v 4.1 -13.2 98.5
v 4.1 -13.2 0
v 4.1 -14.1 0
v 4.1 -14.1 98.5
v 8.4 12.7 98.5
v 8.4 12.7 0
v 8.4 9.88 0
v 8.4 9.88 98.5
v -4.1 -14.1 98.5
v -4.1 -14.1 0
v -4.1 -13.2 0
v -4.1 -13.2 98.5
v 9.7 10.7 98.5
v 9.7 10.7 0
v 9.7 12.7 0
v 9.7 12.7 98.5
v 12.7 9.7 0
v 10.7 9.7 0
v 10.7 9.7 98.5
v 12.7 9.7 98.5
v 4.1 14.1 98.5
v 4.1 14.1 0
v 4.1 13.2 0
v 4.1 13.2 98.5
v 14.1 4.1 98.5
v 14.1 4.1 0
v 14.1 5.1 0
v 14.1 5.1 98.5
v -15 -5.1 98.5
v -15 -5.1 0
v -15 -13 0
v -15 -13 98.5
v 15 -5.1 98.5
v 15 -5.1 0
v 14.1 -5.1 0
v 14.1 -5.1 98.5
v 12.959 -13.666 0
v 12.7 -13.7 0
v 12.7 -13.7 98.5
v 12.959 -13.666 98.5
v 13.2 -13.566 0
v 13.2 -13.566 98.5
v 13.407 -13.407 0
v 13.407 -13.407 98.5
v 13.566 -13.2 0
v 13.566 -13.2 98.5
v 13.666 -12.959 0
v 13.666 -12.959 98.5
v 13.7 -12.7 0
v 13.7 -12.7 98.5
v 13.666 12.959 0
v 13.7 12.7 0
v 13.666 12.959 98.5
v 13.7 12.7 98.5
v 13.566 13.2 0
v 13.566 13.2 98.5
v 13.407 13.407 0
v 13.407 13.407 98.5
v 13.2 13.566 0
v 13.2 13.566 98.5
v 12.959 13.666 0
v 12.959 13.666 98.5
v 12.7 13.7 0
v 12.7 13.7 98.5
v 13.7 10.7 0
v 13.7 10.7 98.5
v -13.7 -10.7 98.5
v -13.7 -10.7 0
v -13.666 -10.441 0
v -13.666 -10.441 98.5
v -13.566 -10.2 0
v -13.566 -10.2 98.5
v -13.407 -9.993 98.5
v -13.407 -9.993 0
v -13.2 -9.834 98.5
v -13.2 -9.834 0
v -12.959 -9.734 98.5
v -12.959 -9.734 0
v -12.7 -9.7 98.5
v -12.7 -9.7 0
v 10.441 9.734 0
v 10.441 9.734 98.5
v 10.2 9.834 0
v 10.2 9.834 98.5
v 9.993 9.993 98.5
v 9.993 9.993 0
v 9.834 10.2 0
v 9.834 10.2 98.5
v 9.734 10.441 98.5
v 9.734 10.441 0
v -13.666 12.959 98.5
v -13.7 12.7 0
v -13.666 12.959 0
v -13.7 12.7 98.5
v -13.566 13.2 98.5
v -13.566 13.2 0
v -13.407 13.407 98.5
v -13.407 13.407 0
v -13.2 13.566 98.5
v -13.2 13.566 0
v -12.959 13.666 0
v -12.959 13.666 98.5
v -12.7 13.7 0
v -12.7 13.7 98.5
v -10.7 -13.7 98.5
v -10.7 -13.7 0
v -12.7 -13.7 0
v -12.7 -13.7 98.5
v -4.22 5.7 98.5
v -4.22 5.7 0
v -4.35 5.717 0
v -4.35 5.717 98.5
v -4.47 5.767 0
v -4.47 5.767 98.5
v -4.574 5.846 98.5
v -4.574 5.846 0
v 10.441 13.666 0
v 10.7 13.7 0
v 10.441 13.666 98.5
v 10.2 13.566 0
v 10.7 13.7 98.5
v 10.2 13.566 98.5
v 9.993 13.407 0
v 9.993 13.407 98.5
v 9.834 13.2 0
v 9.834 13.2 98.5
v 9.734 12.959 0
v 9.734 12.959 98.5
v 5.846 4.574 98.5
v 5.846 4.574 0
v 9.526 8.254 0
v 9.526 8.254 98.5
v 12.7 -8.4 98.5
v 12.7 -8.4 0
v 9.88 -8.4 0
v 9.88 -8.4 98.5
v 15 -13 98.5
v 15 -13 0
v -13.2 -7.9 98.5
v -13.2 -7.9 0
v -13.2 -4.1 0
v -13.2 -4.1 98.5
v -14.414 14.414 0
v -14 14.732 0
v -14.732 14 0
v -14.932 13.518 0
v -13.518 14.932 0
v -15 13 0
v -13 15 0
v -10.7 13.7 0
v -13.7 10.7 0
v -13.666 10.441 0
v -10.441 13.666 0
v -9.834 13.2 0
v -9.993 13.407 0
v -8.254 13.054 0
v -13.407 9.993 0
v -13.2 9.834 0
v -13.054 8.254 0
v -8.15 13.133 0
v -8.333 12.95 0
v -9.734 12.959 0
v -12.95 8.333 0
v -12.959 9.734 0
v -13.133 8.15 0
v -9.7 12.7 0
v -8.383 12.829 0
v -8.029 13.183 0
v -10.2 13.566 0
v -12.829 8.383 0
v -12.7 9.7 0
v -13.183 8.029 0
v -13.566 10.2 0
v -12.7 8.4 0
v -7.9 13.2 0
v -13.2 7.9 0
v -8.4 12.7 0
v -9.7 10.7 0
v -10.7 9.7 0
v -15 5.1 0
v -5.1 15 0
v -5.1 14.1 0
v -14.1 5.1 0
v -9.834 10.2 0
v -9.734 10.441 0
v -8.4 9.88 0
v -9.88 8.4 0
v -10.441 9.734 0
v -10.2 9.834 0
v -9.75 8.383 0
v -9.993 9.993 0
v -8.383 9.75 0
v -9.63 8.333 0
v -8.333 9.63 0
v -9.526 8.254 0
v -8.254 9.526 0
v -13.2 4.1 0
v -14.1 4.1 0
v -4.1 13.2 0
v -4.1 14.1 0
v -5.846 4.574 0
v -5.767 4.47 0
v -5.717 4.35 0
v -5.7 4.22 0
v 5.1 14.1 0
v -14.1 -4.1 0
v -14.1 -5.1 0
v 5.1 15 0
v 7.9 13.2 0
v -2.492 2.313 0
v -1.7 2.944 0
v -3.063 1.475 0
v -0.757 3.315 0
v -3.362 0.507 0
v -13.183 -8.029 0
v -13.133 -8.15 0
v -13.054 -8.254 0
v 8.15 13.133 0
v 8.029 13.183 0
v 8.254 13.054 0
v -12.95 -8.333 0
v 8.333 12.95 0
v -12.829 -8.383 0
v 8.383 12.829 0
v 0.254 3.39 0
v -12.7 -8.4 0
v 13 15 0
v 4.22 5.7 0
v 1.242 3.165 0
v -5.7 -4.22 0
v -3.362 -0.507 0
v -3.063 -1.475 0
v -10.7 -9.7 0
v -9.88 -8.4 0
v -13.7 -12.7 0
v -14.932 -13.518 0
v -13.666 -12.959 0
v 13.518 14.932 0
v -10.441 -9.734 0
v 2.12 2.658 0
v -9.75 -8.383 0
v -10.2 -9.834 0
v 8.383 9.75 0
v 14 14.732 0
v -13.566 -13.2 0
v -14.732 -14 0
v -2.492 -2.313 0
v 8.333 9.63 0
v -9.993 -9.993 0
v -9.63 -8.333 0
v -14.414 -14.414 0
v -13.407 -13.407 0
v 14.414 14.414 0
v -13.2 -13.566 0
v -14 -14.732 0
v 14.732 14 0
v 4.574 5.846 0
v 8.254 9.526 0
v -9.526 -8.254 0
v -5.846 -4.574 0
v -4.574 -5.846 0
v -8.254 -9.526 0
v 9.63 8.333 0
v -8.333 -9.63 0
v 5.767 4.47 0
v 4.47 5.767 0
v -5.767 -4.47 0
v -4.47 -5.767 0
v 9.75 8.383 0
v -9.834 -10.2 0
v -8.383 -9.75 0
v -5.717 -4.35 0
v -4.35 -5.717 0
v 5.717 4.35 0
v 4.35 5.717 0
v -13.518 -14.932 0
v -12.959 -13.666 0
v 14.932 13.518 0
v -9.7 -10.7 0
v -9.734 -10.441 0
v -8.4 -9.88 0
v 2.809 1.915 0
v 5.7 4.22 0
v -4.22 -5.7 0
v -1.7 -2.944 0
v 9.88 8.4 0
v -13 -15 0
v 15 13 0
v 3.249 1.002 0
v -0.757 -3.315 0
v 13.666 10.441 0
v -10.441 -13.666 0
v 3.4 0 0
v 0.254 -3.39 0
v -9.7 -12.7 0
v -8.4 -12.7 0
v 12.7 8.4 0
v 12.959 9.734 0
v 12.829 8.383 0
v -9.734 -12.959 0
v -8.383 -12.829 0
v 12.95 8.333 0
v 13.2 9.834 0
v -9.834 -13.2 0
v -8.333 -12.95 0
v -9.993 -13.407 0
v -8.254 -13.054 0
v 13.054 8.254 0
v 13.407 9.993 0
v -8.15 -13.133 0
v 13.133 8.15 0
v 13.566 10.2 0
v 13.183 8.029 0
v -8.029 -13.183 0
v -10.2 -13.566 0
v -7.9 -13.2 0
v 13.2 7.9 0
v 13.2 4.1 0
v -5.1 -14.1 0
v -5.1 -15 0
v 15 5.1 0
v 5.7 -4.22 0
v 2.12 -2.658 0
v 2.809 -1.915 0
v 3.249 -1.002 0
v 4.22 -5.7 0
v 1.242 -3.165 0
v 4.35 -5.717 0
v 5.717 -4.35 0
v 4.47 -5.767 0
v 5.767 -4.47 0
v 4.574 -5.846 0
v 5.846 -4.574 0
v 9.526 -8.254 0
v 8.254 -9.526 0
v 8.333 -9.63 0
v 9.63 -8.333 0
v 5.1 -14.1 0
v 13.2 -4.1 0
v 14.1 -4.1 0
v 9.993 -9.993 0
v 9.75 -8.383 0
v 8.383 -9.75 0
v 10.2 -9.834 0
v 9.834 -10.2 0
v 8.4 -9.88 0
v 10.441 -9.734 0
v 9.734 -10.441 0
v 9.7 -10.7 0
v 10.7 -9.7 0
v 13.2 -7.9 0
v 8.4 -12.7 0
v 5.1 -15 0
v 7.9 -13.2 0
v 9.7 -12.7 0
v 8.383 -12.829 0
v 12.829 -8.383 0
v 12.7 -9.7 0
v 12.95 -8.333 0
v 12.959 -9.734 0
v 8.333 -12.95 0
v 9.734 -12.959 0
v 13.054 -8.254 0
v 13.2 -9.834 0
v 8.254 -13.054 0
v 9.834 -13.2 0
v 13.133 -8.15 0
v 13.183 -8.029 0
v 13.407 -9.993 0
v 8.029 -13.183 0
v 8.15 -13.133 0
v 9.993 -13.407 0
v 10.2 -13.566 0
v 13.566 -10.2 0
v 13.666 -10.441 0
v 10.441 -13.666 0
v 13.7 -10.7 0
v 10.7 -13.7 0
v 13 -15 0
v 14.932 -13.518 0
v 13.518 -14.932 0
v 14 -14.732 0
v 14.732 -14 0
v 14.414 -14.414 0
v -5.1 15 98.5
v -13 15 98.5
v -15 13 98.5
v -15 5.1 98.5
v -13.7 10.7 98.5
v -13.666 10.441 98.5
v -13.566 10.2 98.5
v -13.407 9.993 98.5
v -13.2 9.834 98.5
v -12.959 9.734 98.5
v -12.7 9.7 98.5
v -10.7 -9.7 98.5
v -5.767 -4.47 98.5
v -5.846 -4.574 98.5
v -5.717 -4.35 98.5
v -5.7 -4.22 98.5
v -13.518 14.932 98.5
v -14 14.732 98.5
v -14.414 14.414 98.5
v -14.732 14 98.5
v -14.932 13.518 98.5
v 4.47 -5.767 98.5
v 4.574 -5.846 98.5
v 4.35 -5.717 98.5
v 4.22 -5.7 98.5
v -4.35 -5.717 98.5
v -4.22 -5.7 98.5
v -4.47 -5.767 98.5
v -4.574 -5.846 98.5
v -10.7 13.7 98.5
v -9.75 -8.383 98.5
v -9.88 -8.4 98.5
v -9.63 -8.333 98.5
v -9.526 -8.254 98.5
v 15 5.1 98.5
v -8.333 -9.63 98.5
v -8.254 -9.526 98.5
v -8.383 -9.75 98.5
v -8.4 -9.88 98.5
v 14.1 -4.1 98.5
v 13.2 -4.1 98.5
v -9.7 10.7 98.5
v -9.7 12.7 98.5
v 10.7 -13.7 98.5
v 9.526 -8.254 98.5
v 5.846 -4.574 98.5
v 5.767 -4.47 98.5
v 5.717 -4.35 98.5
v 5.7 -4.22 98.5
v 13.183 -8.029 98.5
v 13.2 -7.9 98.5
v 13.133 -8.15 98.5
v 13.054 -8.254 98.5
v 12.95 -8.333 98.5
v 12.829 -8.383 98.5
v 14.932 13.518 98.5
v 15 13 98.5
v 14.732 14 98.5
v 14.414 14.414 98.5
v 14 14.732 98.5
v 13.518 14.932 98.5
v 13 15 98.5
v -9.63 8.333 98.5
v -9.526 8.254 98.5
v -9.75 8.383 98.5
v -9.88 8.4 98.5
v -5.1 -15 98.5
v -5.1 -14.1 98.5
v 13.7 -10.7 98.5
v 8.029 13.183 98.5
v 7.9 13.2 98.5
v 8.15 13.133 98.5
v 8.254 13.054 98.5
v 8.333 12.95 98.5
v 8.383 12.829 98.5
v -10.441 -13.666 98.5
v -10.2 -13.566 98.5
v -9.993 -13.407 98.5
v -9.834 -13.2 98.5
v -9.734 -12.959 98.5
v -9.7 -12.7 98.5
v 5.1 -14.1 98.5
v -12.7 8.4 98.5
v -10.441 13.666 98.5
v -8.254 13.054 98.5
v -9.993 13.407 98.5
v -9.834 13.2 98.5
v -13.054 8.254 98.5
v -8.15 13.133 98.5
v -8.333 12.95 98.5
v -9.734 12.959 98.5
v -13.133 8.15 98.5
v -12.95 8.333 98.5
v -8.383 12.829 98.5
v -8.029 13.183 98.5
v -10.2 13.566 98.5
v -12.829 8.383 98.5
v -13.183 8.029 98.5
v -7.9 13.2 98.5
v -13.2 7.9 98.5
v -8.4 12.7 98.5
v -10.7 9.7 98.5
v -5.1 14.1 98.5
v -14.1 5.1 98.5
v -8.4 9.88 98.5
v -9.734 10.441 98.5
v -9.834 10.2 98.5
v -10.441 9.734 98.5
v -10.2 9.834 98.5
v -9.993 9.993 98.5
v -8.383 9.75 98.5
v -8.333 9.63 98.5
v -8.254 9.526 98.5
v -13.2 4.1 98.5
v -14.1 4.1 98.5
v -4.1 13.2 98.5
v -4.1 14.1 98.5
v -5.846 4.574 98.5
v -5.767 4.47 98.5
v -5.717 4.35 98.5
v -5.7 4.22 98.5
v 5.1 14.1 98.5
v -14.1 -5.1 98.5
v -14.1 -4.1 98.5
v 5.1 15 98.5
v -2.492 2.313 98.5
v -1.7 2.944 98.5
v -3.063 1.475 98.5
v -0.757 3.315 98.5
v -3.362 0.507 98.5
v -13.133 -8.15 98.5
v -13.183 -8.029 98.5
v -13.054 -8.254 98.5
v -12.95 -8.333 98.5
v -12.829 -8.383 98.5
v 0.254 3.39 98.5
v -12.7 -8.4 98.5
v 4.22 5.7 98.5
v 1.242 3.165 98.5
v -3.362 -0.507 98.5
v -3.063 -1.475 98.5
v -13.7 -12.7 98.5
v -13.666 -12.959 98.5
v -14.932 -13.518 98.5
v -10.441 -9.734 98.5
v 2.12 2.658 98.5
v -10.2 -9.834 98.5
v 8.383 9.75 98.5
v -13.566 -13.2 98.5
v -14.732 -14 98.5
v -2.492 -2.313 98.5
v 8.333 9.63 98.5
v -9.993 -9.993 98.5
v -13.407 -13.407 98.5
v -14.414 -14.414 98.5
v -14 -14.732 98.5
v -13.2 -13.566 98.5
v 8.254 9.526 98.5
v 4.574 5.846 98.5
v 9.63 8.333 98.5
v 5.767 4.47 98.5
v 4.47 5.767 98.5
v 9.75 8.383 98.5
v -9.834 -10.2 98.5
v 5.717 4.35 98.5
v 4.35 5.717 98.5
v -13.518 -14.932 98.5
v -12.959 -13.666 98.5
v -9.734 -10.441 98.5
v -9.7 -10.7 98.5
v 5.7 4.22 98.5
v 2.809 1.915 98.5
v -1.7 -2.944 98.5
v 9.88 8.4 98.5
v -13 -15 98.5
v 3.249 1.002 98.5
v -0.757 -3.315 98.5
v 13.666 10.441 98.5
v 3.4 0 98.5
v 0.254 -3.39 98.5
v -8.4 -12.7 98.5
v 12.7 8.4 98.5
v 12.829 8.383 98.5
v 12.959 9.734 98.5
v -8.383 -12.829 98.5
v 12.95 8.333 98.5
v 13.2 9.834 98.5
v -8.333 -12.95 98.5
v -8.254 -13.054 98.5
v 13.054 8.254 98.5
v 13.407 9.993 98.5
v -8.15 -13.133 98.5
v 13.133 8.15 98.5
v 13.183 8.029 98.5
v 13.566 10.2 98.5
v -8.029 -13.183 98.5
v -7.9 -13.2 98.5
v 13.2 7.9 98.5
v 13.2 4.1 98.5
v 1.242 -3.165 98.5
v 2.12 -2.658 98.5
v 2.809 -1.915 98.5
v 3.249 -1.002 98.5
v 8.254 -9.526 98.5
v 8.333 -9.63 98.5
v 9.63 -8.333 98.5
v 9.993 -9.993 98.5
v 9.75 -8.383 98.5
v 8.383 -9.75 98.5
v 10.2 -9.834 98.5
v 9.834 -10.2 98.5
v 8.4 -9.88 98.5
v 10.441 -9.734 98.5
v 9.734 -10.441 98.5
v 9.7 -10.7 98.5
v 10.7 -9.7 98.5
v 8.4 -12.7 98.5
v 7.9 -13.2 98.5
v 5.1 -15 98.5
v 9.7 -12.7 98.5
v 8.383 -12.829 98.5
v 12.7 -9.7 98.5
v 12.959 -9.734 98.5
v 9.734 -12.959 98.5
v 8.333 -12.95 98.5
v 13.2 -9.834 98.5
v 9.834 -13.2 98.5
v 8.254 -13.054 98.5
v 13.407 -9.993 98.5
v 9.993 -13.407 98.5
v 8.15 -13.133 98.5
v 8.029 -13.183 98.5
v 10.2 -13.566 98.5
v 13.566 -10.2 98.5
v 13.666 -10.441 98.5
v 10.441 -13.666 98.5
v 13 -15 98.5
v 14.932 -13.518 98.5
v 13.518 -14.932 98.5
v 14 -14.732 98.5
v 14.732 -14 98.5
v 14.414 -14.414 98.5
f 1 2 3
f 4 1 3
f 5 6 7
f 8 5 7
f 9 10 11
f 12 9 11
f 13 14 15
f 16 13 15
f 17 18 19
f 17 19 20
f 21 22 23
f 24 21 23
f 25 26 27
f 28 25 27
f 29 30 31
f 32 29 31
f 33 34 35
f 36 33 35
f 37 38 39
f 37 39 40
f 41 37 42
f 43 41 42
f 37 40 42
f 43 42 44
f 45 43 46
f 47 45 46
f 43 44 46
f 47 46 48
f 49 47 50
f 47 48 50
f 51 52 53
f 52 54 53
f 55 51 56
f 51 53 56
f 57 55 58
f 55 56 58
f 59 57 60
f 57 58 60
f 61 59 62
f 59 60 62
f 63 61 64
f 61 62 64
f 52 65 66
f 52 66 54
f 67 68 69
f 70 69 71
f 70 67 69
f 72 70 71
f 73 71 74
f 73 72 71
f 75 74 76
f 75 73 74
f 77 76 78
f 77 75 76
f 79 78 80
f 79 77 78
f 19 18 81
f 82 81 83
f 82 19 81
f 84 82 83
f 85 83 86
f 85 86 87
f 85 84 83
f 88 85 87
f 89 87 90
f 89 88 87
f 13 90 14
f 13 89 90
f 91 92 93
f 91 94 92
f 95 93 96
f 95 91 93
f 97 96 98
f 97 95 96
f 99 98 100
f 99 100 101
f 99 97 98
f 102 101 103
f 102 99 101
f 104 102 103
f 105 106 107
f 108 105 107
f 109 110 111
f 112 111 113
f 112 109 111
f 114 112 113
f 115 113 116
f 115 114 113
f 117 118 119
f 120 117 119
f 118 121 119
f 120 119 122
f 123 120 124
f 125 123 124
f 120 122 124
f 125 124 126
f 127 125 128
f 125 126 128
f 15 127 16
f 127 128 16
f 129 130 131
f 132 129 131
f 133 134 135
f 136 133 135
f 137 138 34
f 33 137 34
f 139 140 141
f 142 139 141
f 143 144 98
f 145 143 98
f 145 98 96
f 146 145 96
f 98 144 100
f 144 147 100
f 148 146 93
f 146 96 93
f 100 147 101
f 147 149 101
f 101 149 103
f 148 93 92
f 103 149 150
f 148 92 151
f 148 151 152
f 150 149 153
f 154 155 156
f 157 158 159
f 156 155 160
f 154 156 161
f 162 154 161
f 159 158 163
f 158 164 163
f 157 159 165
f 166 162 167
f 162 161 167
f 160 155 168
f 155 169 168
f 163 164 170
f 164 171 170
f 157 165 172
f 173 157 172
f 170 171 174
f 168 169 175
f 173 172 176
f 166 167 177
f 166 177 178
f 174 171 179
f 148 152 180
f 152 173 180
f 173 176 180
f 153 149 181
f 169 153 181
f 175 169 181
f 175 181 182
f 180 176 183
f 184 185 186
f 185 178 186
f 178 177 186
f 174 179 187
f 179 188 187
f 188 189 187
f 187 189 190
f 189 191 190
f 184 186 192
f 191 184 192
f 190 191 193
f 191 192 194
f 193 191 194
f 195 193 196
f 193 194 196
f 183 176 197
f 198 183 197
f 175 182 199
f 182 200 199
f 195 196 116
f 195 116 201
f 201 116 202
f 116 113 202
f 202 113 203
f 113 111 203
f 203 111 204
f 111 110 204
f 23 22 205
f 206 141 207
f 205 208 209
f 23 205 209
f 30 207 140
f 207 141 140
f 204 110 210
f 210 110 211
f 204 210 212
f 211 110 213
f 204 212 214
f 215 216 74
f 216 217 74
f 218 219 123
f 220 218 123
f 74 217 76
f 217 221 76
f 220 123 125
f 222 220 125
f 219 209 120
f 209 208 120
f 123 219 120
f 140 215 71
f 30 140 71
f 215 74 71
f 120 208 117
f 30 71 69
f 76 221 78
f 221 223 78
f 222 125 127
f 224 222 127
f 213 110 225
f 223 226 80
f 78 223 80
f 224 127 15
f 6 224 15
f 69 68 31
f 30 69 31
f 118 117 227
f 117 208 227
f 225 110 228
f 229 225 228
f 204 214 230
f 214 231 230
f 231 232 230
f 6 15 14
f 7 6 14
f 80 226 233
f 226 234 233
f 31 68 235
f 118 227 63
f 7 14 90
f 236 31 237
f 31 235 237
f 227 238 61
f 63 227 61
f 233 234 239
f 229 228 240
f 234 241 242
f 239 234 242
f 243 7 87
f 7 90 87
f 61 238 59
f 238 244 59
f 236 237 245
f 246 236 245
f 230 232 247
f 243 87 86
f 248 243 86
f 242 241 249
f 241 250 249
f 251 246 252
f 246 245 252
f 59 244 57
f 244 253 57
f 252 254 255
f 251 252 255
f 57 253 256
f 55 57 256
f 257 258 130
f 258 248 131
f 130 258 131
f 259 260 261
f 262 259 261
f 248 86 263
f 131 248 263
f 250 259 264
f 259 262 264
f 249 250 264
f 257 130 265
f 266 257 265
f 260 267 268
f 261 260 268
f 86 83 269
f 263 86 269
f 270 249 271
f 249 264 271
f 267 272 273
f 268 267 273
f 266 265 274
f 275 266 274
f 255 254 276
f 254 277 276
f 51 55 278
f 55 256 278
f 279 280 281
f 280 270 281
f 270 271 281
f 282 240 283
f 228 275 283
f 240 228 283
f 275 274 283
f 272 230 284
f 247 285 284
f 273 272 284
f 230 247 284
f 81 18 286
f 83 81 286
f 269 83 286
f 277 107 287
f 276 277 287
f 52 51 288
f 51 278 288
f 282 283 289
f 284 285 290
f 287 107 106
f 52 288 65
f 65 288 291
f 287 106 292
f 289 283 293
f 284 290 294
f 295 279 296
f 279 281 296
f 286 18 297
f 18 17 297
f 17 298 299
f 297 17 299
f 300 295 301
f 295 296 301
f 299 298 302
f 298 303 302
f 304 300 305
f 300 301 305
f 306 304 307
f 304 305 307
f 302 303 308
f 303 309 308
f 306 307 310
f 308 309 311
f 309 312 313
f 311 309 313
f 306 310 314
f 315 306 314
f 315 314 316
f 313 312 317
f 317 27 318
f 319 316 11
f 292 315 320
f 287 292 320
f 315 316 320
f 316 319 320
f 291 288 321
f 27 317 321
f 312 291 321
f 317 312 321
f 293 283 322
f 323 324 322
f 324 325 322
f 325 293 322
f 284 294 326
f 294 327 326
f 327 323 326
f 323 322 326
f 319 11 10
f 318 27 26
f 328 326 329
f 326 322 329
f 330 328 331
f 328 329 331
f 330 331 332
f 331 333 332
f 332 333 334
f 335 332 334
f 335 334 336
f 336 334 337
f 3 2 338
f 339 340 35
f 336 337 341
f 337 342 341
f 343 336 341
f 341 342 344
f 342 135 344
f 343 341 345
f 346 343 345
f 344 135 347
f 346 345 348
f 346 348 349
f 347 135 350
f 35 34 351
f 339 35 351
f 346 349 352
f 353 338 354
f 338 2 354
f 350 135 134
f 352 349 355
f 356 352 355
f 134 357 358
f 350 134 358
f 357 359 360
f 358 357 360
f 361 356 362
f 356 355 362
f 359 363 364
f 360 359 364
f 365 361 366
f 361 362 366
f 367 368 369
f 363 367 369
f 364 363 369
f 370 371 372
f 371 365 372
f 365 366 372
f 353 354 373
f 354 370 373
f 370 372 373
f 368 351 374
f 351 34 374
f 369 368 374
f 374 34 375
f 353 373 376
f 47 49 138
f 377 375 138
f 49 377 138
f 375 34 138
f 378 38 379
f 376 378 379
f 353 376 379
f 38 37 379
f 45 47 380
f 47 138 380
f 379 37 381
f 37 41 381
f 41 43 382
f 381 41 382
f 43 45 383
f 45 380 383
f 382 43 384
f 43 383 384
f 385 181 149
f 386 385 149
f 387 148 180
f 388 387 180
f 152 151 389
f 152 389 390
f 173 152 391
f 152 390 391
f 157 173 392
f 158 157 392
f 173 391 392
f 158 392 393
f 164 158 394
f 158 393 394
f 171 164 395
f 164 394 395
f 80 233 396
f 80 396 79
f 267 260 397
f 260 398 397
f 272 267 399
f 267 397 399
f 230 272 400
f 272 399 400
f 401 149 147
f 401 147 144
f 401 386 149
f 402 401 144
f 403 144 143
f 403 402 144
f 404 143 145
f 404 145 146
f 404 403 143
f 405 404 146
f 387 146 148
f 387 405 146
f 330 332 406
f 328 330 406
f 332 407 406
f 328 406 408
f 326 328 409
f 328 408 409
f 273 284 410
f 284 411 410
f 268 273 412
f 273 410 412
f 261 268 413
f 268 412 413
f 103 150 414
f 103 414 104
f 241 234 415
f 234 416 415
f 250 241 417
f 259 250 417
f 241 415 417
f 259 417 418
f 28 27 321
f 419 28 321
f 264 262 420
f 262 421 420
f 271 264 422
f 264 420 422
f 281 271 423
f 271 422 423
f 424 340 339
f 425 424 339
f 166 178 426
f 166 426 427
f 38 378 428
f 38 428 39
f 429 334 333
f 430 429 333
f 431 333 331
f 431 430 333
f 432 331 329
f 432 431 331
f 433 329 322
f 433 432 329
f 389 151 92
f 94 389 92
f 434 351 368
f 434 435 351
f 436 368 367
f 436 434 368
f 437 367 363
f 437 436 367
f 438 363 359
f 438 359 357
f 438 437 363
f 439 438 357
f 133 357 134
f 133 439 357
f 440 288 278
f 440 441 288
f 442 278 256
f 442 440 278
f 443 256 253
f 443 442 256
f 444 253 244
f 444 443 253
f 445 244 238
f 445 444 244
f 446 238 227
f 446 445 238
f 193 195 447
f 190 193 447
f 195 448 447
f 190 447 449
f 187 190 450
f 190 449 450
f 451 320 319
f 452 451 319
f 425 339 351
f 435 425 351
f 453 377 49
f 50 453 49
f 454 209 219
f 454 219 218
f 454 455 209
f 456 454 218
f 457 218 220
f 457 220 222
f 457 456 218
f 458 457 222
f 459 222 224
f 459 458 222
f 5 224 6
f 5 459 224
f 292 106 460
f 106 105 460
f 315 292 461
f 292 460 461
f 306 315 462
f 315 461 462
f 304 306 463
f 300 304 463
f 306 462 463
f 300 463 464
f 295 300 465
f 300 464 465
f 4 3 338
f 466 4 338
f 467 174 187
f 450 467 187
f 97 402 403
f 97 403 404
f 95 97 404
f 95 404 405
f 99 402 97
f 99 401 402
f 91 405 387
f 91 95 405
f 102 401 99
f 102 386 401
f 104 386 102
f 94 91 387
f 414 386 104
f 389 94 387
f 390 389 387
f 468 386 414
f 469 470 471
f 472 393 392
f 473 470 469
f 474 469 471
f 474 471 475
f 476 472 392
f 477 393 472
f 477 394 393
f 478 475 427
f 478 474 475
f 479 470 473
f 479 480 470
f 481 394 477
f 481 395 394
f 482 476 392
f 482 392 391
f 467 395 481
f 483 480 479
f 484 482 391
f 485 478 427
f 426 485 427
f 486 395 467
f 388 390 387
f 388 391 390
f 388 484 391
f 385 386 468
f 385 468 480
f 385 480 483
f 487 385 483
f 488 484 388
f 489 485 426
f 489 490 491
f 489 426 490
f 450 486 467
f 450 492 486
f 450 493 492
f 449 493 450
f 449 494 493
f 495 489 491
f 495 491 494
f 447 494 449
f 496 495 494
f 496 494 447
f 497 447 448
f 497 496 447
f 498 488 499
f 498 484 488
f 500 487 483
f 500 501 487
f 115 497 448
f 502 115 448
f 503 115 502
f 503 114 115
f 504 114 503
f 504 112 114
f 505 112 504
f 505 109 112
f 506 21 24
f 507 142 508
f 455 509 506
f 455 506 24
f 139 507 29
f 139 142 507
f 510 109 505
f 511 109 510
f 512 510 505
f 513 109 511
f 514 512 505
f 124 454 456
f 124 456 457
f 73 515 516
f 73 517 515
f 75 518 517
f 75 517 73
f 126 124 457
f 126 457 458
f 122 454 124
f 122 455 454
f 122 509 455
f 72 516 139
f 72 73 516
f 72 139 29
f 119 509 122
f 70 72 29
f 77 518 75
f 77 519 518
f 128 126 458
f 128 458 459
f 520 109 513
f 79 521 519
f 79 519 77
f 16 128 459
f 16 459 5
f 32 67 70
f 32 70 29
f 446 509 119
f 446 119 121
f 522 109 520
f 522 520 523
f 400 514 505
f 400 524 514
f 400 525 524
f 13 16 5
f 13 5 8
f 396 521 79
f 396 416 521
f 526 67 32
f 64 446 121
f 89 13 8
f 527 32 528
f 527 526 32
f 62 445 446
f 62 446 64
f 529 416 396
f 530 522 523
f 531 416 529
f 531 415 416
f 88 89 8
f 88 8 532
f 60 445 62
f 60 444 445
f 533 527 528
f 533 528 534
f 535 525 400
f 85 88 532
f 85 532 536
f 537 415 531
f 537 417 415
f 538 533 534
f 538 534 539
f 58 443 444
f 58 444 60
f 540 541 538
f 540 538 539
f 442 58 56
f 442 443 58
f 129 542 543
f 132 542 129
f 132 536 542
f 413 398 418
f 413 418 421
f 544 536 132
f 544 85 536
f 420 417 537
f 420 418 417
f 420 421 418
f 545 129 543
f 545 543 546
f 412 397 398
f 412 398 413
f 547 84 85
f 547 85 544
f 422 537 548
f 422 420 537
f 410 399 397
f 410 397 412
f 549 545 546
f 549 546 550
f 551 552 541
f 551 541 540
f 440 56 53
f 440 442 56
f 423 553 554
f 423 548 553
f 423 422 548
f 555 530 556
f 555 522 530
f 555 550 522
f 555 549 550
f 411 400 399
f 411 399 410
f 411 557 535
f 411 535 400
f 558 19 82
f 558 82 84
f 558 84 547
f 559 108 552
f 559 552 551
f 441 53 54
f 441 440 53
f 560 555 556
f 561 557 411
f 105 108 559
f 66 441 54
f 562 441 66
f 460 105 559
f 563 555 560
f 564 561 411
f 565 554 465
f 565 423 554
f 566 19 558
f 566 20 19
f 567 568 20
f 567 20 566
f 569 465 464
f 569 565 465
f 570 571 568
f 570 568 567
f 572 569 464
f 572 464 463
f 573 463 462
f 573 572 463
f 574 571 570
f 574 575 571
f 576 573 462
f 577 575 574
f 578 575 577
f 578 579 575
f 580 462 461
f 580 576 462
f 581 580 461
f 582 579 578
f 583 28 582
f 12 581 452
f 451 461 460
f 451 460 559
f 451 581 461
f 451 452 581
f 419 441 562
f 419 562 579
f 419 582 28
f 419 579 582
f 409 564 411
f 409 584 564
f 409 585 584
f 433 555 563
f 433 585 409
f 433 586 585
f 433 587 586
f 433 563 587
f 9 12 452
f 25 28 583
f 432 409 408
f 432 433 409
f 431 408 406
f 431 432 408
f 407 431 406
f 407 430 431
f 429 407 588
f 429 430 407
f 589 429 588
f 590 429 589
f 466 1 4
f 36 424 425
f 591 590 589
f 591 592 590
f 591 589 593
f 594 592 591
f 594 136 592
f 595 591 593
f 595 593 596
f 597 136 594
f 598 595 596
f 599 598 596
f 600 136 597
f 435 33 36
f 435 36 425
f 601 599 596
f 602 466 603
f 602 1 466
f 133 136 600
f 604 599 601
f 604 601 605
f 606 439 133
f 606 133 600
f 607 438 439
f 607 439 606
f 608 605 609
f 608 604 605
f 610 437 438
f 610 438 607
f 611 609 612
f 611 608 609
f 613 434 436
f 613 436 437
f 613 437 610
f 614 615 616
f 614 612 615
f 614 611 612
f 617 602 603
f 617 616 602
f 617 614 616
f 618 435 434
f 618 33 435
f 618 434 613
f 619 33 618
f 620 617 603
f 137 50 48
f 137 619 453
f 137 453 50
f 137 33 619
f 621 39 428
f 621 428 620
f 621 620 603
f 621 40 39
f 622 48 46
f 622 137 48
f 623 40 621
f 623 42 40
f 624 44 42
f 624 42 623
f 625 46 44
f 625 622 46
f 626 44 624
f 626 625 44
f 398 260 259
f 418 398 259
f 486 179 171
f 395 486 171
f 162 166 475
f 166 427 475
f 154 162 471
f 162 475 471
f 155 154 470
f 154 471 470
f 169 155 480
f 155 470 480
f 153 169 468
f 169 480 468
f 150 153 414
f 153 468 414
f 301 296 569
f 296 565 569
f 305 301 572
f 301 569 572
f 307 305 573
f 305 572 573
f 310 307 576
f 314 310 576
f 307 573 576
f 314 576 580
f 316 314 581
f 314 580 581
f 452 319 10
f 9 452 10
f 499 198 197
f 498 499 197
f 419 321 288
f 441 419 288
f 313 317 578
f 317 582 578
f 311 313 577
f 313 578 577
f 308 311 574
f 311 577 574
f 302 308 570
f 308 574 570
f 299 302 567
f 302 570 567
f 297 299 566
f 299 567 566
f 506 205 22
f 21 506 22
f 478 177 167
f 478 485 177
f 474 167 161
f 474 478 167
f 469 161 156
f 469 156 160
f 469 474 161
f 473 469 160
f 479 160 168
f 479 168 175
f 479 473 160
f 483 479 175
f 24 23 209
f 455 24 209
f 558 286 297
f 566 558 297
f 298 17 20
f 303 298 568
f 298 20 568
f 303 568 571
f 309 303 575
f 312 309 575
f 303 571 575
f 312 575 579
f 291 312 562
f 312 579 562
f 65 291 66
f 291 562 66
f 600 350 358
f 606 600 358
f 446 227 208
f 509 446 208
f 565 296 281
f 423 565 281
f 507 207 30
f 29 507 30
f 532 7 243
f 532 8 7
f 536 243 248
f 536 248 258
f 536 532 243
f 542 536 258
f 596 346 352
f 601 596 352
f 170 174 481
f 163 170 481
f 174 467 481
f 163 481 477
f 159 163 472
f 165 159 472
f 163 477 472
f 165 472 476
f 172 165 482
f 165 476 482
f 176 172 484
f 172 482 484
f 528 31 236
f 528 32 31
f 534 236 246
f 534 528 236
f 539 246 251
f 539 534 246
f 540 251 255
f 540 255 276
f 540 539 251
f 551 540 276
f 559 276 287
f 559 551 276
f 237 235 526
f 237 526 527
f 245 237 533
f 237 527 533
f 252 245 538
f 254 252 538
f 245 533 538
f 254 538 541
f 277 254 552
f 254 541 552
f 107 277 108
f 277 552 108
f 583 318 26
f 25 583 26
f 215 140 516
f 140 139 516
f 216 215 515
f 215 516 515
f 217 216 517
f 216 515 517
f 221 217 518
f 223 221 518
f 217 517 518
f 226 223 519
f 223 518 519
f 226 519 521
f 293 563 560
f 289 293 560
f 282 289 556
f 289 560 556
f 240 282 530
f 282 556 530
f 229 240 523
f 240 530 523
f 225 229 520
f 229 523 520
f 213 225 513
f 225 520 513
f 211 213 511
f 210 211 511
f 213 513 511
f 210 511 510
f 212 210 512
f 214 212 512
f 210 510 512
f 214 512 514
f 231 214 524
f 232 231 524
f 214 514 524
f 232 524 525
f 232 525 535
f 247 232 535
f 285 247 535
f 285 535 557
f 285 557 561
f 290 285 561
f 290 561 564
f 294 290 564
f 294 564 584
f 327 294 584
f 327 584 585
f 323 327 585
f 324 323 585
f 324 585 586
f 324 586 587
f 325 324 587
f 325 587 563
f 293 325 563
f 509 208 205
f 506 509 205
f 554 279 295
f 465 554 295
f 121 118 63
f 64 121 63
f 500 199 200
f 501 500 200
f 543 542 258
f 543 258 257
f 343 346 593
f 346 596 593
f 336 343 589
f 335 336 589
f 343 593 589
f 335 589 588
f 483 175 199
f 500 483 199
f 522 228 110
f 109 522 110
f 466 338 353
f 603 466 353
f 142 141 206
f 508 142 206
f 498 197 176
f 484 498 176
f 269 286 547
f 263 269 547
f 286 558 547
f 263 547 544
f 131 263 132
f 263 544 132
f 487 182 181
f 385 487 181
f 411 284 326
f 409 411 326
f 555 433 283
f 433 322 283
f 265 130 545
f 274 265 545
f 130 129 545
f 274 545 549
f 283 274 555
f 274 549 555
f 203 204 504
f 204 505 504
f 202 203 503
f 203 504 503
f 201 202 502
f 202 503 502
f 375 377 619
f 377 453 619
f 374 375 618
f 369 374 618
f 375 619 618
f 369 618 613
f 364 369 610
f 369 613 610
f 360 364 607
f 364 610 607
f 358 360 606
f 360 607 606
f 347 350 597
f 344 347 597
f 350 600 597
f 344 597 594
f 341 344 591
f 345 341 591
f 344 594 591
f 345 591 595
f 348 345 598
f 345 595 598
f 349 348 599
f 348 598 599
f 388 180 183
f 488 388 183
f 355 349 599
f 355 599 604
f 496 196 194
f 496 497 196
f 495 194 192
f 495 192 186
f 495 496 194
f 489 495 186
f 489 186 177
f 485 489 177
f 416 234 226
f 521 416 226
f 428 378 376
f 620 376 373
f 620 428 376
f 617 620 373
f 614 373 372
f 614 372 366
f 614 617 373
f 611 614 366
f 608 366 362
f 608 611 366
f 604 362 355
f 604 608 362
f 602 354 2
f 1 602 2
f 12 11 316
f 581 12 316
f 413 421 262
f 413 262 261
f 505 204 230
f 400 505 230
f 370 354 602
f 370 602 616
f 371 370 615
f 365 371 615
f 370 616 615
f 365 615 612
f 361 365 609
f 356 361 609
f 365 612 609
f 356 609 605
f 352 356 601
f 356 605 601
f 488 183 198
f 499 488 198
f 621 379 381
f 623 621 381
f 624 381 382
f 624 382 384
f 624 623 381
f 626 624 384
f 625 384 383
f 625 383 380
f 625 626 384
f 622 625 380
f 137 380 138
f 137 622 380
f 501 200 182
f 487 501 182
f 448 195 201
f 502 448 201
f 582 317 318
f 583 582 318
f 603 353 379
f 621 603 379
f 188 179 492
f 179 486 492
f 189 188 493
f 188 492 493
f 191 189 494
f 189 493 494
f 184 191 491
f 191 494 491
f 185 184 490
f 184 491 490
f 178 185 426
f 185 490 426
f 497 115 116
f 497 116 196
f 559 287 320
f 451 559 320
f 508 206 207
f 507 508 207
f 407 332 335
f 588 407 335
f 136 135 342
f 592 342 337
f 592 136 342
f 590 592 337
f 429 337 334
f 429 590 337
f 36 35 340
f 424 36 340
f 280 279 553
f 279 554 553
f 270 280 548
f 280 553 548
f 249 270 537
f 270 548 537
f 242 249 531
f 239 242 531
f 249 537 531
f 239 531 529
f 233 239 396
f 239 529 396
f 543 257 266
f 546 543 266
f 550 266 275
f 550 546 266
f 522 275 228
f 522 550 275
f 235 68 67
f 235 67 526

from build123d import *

# Parameters (mm, degrees)
SKETCH_1_W                       = 4
SKETCH_1_H                       = 4
EXTRUDE_1_DEPTH                  = 98.5
FILLET_1_R                       = 1
FILLET_2_R                       = 2
FILLET_3_R                       = 0.5
PATTERN_CIRCULAR_1_COUNT         = 4
FILLET_1_OF_PATTERN_CIRCULAR_1_R = 1
FILLET_2_OF_PATTERN_CIRCULAR_1_R = 2
FILLET_3_OF_PATTERN_CIRCULAR_1_R = 0.5
SKETCH_2_R                       = 3.4
CUT_EXTRUDE_1_DEPTH              = 99.5


with BuildPart() as part:
    # 草图1 → 凸台-拉伸1 (new body)
    with BuildSketch(Plane.XY):
        Polygon((5.7, 0), (5.7, 4.427207794), (9.672792206, 8.4), (13.2, 8.4), (13.2, 4.1), (14.1, 4.1), (14.1, 5.1), (15, 5.1), (15, 15), (5.1, 15), (5.1, 14.1), (4.1, 14.1), (4.1, 13.2), (8.4, 13.2), (8.4, 9.672792206), (4.427207794, 5.7), (0, 5.7), (0, 0), align=None)
        with Locations((11.7, 11.7)):
            Rectangle(SKETCH_1_W, SKETCH_1_H, mode=Mode.SUBTRACT)
    extrude_1 = extrude(amount=EXTRUDE_1_DEPTH)

    # 圆角1
    fillet_1_edges = [part.edges().sort_by_distance(p)[0] for p in [
        (13.7, 9.7, 49.25),
        (13.7, 13.7, 49.25),
        (9.7, 13.7, 49.25),
        (9.7, 9.7, 49.25),
    ]]
    fillet(fillet_1_edges, radius=FILLET_1_R)

    # 圆角2
    fillet_2_edges = [part.edges().sort_by_distance(p)[0] for p in [
        (15, 15, 49.25),
    ]]
    fillet(fillet_2_edges, radius=FILLET_2_R)

    # 圆角3
    fillet_3_edges = [part.edges().sort_by_distance(p)[0] for p in [
        (4.427207794, 5.7, 49.25),
        (8.4, 9.672792206, 49.25),
        (8.4, 13.2, 49.25),
        (13.2, 8.4, 49.25),
        (9.672792206, 8.4, 49.25),
        (5.7, 4.427207794, 49.25),
    ]]
    fillet(fillet_3_edges, radius=FILLET_3_R)

    # 阵列(圆周)1: 凸台-拉伸1 ×4 about axis
    pattern_circular_1_axis = Axis((0, 0, 0), (0, 0, 1))
    for i in range(1, PATTERN_CIRCULAR_1_COUNT):
        add(extrude_1.rotate(pattern_circular_1_axis, i * 360 / PATTERN_CIRCULAR_1_COUNT))

    # 圆角1 of 阵列(圆周)1
    fillet_1_of_pattern_circular_1_edges = [part.edges().sort_by_distance(p)[0] for p in [
        (-9.7, 13.7, 49.25),
        (-13.7, 13.7, 49.25),
        (-13.7, 9.7, 49.25),
        (-9.7, 9.7, 49.25),
        (-13.7, -9.7, 49.25),
        (-13.7, -13.7, 49.25),
        (-9.7, -13.7, 49.25),
        (-9.7, -9.7, 49.25),
        (9.7, -13.7, 49.25),
        (13.7, -13.7, 49.25),
        (13.7, -9.7, 49.25),
        (9.7, -9.7, 49.25),
    ]]
    fillet(fillet_1_of_pattern_circular_1_edges, radius=FILLET_1_OF_PATTERN_CIRCULAR_1_R)

    # 圆角2 of 阵列(圆周)1
    fillet_2_of_pattern_circular_1_edges = [part.edges().sort_by_distance(p)[0] for p in [
        (-15, 15, 49.25),
        (-15, -15, 49.25),
        (15, -15, 49.25),
    ]]
    fillet(fillet_2_of_pattern_circular_1_edges, radius=FILLET_2_OF_PATTERN_CIRCULAR_1_R)

    # 圆角3 of 阵列(圆周)1
    fillet_3_of_pattern_circular_1_edges = [part.edges().sort_by_distance(p)[0] for p in [
        (-5.7, 4.427207794, 49.25),
        (-9.672792206, 8.4, 49.25),
        (-13.2, 8.4, 49.25),
        (-8.4, 13.2, 49.25),
        (-8.4, 9.672792206, 49.25),
        (-4.427207794, 5.7, 49.25),
        (-4.427207794, -5.7, 49.25),
        (-8.4, -9.672792206, 49.25),
        (-8.4, -13.2, 49.25),
        (-13.2, -8.4, 49.25),
        (-9.672792206, -8.4, 49.25),
        (-5.7, -4.427207794, 49.25),
        (5.7, -4.427207794, 49.25),
        (9.672792206, -8.4, 49.25),
        (13.2, -8.4, 49.25),
        (8.4, -13.2, 49.25),
        (8.4, -9.672792206, 49.25),
        (4.427207794, -5.7, 49.25),
    ]]
    fillet(fillet_3_of_pattern_circular_1_edges, radius=FILLET_3_OF_PATTERN_CIRCULAR_1_R)

    # 草图2 → 切除-拉伸1 (cut, through all)
    with BuildSketch(Plane.XY.offset(98.5)):
        Circle(SKETCH_2_R)
    extrude(amount=-CUT_EXTRUDE_1_DEPTH, mode=Mode.SUBTRACT)


solid = part.part
